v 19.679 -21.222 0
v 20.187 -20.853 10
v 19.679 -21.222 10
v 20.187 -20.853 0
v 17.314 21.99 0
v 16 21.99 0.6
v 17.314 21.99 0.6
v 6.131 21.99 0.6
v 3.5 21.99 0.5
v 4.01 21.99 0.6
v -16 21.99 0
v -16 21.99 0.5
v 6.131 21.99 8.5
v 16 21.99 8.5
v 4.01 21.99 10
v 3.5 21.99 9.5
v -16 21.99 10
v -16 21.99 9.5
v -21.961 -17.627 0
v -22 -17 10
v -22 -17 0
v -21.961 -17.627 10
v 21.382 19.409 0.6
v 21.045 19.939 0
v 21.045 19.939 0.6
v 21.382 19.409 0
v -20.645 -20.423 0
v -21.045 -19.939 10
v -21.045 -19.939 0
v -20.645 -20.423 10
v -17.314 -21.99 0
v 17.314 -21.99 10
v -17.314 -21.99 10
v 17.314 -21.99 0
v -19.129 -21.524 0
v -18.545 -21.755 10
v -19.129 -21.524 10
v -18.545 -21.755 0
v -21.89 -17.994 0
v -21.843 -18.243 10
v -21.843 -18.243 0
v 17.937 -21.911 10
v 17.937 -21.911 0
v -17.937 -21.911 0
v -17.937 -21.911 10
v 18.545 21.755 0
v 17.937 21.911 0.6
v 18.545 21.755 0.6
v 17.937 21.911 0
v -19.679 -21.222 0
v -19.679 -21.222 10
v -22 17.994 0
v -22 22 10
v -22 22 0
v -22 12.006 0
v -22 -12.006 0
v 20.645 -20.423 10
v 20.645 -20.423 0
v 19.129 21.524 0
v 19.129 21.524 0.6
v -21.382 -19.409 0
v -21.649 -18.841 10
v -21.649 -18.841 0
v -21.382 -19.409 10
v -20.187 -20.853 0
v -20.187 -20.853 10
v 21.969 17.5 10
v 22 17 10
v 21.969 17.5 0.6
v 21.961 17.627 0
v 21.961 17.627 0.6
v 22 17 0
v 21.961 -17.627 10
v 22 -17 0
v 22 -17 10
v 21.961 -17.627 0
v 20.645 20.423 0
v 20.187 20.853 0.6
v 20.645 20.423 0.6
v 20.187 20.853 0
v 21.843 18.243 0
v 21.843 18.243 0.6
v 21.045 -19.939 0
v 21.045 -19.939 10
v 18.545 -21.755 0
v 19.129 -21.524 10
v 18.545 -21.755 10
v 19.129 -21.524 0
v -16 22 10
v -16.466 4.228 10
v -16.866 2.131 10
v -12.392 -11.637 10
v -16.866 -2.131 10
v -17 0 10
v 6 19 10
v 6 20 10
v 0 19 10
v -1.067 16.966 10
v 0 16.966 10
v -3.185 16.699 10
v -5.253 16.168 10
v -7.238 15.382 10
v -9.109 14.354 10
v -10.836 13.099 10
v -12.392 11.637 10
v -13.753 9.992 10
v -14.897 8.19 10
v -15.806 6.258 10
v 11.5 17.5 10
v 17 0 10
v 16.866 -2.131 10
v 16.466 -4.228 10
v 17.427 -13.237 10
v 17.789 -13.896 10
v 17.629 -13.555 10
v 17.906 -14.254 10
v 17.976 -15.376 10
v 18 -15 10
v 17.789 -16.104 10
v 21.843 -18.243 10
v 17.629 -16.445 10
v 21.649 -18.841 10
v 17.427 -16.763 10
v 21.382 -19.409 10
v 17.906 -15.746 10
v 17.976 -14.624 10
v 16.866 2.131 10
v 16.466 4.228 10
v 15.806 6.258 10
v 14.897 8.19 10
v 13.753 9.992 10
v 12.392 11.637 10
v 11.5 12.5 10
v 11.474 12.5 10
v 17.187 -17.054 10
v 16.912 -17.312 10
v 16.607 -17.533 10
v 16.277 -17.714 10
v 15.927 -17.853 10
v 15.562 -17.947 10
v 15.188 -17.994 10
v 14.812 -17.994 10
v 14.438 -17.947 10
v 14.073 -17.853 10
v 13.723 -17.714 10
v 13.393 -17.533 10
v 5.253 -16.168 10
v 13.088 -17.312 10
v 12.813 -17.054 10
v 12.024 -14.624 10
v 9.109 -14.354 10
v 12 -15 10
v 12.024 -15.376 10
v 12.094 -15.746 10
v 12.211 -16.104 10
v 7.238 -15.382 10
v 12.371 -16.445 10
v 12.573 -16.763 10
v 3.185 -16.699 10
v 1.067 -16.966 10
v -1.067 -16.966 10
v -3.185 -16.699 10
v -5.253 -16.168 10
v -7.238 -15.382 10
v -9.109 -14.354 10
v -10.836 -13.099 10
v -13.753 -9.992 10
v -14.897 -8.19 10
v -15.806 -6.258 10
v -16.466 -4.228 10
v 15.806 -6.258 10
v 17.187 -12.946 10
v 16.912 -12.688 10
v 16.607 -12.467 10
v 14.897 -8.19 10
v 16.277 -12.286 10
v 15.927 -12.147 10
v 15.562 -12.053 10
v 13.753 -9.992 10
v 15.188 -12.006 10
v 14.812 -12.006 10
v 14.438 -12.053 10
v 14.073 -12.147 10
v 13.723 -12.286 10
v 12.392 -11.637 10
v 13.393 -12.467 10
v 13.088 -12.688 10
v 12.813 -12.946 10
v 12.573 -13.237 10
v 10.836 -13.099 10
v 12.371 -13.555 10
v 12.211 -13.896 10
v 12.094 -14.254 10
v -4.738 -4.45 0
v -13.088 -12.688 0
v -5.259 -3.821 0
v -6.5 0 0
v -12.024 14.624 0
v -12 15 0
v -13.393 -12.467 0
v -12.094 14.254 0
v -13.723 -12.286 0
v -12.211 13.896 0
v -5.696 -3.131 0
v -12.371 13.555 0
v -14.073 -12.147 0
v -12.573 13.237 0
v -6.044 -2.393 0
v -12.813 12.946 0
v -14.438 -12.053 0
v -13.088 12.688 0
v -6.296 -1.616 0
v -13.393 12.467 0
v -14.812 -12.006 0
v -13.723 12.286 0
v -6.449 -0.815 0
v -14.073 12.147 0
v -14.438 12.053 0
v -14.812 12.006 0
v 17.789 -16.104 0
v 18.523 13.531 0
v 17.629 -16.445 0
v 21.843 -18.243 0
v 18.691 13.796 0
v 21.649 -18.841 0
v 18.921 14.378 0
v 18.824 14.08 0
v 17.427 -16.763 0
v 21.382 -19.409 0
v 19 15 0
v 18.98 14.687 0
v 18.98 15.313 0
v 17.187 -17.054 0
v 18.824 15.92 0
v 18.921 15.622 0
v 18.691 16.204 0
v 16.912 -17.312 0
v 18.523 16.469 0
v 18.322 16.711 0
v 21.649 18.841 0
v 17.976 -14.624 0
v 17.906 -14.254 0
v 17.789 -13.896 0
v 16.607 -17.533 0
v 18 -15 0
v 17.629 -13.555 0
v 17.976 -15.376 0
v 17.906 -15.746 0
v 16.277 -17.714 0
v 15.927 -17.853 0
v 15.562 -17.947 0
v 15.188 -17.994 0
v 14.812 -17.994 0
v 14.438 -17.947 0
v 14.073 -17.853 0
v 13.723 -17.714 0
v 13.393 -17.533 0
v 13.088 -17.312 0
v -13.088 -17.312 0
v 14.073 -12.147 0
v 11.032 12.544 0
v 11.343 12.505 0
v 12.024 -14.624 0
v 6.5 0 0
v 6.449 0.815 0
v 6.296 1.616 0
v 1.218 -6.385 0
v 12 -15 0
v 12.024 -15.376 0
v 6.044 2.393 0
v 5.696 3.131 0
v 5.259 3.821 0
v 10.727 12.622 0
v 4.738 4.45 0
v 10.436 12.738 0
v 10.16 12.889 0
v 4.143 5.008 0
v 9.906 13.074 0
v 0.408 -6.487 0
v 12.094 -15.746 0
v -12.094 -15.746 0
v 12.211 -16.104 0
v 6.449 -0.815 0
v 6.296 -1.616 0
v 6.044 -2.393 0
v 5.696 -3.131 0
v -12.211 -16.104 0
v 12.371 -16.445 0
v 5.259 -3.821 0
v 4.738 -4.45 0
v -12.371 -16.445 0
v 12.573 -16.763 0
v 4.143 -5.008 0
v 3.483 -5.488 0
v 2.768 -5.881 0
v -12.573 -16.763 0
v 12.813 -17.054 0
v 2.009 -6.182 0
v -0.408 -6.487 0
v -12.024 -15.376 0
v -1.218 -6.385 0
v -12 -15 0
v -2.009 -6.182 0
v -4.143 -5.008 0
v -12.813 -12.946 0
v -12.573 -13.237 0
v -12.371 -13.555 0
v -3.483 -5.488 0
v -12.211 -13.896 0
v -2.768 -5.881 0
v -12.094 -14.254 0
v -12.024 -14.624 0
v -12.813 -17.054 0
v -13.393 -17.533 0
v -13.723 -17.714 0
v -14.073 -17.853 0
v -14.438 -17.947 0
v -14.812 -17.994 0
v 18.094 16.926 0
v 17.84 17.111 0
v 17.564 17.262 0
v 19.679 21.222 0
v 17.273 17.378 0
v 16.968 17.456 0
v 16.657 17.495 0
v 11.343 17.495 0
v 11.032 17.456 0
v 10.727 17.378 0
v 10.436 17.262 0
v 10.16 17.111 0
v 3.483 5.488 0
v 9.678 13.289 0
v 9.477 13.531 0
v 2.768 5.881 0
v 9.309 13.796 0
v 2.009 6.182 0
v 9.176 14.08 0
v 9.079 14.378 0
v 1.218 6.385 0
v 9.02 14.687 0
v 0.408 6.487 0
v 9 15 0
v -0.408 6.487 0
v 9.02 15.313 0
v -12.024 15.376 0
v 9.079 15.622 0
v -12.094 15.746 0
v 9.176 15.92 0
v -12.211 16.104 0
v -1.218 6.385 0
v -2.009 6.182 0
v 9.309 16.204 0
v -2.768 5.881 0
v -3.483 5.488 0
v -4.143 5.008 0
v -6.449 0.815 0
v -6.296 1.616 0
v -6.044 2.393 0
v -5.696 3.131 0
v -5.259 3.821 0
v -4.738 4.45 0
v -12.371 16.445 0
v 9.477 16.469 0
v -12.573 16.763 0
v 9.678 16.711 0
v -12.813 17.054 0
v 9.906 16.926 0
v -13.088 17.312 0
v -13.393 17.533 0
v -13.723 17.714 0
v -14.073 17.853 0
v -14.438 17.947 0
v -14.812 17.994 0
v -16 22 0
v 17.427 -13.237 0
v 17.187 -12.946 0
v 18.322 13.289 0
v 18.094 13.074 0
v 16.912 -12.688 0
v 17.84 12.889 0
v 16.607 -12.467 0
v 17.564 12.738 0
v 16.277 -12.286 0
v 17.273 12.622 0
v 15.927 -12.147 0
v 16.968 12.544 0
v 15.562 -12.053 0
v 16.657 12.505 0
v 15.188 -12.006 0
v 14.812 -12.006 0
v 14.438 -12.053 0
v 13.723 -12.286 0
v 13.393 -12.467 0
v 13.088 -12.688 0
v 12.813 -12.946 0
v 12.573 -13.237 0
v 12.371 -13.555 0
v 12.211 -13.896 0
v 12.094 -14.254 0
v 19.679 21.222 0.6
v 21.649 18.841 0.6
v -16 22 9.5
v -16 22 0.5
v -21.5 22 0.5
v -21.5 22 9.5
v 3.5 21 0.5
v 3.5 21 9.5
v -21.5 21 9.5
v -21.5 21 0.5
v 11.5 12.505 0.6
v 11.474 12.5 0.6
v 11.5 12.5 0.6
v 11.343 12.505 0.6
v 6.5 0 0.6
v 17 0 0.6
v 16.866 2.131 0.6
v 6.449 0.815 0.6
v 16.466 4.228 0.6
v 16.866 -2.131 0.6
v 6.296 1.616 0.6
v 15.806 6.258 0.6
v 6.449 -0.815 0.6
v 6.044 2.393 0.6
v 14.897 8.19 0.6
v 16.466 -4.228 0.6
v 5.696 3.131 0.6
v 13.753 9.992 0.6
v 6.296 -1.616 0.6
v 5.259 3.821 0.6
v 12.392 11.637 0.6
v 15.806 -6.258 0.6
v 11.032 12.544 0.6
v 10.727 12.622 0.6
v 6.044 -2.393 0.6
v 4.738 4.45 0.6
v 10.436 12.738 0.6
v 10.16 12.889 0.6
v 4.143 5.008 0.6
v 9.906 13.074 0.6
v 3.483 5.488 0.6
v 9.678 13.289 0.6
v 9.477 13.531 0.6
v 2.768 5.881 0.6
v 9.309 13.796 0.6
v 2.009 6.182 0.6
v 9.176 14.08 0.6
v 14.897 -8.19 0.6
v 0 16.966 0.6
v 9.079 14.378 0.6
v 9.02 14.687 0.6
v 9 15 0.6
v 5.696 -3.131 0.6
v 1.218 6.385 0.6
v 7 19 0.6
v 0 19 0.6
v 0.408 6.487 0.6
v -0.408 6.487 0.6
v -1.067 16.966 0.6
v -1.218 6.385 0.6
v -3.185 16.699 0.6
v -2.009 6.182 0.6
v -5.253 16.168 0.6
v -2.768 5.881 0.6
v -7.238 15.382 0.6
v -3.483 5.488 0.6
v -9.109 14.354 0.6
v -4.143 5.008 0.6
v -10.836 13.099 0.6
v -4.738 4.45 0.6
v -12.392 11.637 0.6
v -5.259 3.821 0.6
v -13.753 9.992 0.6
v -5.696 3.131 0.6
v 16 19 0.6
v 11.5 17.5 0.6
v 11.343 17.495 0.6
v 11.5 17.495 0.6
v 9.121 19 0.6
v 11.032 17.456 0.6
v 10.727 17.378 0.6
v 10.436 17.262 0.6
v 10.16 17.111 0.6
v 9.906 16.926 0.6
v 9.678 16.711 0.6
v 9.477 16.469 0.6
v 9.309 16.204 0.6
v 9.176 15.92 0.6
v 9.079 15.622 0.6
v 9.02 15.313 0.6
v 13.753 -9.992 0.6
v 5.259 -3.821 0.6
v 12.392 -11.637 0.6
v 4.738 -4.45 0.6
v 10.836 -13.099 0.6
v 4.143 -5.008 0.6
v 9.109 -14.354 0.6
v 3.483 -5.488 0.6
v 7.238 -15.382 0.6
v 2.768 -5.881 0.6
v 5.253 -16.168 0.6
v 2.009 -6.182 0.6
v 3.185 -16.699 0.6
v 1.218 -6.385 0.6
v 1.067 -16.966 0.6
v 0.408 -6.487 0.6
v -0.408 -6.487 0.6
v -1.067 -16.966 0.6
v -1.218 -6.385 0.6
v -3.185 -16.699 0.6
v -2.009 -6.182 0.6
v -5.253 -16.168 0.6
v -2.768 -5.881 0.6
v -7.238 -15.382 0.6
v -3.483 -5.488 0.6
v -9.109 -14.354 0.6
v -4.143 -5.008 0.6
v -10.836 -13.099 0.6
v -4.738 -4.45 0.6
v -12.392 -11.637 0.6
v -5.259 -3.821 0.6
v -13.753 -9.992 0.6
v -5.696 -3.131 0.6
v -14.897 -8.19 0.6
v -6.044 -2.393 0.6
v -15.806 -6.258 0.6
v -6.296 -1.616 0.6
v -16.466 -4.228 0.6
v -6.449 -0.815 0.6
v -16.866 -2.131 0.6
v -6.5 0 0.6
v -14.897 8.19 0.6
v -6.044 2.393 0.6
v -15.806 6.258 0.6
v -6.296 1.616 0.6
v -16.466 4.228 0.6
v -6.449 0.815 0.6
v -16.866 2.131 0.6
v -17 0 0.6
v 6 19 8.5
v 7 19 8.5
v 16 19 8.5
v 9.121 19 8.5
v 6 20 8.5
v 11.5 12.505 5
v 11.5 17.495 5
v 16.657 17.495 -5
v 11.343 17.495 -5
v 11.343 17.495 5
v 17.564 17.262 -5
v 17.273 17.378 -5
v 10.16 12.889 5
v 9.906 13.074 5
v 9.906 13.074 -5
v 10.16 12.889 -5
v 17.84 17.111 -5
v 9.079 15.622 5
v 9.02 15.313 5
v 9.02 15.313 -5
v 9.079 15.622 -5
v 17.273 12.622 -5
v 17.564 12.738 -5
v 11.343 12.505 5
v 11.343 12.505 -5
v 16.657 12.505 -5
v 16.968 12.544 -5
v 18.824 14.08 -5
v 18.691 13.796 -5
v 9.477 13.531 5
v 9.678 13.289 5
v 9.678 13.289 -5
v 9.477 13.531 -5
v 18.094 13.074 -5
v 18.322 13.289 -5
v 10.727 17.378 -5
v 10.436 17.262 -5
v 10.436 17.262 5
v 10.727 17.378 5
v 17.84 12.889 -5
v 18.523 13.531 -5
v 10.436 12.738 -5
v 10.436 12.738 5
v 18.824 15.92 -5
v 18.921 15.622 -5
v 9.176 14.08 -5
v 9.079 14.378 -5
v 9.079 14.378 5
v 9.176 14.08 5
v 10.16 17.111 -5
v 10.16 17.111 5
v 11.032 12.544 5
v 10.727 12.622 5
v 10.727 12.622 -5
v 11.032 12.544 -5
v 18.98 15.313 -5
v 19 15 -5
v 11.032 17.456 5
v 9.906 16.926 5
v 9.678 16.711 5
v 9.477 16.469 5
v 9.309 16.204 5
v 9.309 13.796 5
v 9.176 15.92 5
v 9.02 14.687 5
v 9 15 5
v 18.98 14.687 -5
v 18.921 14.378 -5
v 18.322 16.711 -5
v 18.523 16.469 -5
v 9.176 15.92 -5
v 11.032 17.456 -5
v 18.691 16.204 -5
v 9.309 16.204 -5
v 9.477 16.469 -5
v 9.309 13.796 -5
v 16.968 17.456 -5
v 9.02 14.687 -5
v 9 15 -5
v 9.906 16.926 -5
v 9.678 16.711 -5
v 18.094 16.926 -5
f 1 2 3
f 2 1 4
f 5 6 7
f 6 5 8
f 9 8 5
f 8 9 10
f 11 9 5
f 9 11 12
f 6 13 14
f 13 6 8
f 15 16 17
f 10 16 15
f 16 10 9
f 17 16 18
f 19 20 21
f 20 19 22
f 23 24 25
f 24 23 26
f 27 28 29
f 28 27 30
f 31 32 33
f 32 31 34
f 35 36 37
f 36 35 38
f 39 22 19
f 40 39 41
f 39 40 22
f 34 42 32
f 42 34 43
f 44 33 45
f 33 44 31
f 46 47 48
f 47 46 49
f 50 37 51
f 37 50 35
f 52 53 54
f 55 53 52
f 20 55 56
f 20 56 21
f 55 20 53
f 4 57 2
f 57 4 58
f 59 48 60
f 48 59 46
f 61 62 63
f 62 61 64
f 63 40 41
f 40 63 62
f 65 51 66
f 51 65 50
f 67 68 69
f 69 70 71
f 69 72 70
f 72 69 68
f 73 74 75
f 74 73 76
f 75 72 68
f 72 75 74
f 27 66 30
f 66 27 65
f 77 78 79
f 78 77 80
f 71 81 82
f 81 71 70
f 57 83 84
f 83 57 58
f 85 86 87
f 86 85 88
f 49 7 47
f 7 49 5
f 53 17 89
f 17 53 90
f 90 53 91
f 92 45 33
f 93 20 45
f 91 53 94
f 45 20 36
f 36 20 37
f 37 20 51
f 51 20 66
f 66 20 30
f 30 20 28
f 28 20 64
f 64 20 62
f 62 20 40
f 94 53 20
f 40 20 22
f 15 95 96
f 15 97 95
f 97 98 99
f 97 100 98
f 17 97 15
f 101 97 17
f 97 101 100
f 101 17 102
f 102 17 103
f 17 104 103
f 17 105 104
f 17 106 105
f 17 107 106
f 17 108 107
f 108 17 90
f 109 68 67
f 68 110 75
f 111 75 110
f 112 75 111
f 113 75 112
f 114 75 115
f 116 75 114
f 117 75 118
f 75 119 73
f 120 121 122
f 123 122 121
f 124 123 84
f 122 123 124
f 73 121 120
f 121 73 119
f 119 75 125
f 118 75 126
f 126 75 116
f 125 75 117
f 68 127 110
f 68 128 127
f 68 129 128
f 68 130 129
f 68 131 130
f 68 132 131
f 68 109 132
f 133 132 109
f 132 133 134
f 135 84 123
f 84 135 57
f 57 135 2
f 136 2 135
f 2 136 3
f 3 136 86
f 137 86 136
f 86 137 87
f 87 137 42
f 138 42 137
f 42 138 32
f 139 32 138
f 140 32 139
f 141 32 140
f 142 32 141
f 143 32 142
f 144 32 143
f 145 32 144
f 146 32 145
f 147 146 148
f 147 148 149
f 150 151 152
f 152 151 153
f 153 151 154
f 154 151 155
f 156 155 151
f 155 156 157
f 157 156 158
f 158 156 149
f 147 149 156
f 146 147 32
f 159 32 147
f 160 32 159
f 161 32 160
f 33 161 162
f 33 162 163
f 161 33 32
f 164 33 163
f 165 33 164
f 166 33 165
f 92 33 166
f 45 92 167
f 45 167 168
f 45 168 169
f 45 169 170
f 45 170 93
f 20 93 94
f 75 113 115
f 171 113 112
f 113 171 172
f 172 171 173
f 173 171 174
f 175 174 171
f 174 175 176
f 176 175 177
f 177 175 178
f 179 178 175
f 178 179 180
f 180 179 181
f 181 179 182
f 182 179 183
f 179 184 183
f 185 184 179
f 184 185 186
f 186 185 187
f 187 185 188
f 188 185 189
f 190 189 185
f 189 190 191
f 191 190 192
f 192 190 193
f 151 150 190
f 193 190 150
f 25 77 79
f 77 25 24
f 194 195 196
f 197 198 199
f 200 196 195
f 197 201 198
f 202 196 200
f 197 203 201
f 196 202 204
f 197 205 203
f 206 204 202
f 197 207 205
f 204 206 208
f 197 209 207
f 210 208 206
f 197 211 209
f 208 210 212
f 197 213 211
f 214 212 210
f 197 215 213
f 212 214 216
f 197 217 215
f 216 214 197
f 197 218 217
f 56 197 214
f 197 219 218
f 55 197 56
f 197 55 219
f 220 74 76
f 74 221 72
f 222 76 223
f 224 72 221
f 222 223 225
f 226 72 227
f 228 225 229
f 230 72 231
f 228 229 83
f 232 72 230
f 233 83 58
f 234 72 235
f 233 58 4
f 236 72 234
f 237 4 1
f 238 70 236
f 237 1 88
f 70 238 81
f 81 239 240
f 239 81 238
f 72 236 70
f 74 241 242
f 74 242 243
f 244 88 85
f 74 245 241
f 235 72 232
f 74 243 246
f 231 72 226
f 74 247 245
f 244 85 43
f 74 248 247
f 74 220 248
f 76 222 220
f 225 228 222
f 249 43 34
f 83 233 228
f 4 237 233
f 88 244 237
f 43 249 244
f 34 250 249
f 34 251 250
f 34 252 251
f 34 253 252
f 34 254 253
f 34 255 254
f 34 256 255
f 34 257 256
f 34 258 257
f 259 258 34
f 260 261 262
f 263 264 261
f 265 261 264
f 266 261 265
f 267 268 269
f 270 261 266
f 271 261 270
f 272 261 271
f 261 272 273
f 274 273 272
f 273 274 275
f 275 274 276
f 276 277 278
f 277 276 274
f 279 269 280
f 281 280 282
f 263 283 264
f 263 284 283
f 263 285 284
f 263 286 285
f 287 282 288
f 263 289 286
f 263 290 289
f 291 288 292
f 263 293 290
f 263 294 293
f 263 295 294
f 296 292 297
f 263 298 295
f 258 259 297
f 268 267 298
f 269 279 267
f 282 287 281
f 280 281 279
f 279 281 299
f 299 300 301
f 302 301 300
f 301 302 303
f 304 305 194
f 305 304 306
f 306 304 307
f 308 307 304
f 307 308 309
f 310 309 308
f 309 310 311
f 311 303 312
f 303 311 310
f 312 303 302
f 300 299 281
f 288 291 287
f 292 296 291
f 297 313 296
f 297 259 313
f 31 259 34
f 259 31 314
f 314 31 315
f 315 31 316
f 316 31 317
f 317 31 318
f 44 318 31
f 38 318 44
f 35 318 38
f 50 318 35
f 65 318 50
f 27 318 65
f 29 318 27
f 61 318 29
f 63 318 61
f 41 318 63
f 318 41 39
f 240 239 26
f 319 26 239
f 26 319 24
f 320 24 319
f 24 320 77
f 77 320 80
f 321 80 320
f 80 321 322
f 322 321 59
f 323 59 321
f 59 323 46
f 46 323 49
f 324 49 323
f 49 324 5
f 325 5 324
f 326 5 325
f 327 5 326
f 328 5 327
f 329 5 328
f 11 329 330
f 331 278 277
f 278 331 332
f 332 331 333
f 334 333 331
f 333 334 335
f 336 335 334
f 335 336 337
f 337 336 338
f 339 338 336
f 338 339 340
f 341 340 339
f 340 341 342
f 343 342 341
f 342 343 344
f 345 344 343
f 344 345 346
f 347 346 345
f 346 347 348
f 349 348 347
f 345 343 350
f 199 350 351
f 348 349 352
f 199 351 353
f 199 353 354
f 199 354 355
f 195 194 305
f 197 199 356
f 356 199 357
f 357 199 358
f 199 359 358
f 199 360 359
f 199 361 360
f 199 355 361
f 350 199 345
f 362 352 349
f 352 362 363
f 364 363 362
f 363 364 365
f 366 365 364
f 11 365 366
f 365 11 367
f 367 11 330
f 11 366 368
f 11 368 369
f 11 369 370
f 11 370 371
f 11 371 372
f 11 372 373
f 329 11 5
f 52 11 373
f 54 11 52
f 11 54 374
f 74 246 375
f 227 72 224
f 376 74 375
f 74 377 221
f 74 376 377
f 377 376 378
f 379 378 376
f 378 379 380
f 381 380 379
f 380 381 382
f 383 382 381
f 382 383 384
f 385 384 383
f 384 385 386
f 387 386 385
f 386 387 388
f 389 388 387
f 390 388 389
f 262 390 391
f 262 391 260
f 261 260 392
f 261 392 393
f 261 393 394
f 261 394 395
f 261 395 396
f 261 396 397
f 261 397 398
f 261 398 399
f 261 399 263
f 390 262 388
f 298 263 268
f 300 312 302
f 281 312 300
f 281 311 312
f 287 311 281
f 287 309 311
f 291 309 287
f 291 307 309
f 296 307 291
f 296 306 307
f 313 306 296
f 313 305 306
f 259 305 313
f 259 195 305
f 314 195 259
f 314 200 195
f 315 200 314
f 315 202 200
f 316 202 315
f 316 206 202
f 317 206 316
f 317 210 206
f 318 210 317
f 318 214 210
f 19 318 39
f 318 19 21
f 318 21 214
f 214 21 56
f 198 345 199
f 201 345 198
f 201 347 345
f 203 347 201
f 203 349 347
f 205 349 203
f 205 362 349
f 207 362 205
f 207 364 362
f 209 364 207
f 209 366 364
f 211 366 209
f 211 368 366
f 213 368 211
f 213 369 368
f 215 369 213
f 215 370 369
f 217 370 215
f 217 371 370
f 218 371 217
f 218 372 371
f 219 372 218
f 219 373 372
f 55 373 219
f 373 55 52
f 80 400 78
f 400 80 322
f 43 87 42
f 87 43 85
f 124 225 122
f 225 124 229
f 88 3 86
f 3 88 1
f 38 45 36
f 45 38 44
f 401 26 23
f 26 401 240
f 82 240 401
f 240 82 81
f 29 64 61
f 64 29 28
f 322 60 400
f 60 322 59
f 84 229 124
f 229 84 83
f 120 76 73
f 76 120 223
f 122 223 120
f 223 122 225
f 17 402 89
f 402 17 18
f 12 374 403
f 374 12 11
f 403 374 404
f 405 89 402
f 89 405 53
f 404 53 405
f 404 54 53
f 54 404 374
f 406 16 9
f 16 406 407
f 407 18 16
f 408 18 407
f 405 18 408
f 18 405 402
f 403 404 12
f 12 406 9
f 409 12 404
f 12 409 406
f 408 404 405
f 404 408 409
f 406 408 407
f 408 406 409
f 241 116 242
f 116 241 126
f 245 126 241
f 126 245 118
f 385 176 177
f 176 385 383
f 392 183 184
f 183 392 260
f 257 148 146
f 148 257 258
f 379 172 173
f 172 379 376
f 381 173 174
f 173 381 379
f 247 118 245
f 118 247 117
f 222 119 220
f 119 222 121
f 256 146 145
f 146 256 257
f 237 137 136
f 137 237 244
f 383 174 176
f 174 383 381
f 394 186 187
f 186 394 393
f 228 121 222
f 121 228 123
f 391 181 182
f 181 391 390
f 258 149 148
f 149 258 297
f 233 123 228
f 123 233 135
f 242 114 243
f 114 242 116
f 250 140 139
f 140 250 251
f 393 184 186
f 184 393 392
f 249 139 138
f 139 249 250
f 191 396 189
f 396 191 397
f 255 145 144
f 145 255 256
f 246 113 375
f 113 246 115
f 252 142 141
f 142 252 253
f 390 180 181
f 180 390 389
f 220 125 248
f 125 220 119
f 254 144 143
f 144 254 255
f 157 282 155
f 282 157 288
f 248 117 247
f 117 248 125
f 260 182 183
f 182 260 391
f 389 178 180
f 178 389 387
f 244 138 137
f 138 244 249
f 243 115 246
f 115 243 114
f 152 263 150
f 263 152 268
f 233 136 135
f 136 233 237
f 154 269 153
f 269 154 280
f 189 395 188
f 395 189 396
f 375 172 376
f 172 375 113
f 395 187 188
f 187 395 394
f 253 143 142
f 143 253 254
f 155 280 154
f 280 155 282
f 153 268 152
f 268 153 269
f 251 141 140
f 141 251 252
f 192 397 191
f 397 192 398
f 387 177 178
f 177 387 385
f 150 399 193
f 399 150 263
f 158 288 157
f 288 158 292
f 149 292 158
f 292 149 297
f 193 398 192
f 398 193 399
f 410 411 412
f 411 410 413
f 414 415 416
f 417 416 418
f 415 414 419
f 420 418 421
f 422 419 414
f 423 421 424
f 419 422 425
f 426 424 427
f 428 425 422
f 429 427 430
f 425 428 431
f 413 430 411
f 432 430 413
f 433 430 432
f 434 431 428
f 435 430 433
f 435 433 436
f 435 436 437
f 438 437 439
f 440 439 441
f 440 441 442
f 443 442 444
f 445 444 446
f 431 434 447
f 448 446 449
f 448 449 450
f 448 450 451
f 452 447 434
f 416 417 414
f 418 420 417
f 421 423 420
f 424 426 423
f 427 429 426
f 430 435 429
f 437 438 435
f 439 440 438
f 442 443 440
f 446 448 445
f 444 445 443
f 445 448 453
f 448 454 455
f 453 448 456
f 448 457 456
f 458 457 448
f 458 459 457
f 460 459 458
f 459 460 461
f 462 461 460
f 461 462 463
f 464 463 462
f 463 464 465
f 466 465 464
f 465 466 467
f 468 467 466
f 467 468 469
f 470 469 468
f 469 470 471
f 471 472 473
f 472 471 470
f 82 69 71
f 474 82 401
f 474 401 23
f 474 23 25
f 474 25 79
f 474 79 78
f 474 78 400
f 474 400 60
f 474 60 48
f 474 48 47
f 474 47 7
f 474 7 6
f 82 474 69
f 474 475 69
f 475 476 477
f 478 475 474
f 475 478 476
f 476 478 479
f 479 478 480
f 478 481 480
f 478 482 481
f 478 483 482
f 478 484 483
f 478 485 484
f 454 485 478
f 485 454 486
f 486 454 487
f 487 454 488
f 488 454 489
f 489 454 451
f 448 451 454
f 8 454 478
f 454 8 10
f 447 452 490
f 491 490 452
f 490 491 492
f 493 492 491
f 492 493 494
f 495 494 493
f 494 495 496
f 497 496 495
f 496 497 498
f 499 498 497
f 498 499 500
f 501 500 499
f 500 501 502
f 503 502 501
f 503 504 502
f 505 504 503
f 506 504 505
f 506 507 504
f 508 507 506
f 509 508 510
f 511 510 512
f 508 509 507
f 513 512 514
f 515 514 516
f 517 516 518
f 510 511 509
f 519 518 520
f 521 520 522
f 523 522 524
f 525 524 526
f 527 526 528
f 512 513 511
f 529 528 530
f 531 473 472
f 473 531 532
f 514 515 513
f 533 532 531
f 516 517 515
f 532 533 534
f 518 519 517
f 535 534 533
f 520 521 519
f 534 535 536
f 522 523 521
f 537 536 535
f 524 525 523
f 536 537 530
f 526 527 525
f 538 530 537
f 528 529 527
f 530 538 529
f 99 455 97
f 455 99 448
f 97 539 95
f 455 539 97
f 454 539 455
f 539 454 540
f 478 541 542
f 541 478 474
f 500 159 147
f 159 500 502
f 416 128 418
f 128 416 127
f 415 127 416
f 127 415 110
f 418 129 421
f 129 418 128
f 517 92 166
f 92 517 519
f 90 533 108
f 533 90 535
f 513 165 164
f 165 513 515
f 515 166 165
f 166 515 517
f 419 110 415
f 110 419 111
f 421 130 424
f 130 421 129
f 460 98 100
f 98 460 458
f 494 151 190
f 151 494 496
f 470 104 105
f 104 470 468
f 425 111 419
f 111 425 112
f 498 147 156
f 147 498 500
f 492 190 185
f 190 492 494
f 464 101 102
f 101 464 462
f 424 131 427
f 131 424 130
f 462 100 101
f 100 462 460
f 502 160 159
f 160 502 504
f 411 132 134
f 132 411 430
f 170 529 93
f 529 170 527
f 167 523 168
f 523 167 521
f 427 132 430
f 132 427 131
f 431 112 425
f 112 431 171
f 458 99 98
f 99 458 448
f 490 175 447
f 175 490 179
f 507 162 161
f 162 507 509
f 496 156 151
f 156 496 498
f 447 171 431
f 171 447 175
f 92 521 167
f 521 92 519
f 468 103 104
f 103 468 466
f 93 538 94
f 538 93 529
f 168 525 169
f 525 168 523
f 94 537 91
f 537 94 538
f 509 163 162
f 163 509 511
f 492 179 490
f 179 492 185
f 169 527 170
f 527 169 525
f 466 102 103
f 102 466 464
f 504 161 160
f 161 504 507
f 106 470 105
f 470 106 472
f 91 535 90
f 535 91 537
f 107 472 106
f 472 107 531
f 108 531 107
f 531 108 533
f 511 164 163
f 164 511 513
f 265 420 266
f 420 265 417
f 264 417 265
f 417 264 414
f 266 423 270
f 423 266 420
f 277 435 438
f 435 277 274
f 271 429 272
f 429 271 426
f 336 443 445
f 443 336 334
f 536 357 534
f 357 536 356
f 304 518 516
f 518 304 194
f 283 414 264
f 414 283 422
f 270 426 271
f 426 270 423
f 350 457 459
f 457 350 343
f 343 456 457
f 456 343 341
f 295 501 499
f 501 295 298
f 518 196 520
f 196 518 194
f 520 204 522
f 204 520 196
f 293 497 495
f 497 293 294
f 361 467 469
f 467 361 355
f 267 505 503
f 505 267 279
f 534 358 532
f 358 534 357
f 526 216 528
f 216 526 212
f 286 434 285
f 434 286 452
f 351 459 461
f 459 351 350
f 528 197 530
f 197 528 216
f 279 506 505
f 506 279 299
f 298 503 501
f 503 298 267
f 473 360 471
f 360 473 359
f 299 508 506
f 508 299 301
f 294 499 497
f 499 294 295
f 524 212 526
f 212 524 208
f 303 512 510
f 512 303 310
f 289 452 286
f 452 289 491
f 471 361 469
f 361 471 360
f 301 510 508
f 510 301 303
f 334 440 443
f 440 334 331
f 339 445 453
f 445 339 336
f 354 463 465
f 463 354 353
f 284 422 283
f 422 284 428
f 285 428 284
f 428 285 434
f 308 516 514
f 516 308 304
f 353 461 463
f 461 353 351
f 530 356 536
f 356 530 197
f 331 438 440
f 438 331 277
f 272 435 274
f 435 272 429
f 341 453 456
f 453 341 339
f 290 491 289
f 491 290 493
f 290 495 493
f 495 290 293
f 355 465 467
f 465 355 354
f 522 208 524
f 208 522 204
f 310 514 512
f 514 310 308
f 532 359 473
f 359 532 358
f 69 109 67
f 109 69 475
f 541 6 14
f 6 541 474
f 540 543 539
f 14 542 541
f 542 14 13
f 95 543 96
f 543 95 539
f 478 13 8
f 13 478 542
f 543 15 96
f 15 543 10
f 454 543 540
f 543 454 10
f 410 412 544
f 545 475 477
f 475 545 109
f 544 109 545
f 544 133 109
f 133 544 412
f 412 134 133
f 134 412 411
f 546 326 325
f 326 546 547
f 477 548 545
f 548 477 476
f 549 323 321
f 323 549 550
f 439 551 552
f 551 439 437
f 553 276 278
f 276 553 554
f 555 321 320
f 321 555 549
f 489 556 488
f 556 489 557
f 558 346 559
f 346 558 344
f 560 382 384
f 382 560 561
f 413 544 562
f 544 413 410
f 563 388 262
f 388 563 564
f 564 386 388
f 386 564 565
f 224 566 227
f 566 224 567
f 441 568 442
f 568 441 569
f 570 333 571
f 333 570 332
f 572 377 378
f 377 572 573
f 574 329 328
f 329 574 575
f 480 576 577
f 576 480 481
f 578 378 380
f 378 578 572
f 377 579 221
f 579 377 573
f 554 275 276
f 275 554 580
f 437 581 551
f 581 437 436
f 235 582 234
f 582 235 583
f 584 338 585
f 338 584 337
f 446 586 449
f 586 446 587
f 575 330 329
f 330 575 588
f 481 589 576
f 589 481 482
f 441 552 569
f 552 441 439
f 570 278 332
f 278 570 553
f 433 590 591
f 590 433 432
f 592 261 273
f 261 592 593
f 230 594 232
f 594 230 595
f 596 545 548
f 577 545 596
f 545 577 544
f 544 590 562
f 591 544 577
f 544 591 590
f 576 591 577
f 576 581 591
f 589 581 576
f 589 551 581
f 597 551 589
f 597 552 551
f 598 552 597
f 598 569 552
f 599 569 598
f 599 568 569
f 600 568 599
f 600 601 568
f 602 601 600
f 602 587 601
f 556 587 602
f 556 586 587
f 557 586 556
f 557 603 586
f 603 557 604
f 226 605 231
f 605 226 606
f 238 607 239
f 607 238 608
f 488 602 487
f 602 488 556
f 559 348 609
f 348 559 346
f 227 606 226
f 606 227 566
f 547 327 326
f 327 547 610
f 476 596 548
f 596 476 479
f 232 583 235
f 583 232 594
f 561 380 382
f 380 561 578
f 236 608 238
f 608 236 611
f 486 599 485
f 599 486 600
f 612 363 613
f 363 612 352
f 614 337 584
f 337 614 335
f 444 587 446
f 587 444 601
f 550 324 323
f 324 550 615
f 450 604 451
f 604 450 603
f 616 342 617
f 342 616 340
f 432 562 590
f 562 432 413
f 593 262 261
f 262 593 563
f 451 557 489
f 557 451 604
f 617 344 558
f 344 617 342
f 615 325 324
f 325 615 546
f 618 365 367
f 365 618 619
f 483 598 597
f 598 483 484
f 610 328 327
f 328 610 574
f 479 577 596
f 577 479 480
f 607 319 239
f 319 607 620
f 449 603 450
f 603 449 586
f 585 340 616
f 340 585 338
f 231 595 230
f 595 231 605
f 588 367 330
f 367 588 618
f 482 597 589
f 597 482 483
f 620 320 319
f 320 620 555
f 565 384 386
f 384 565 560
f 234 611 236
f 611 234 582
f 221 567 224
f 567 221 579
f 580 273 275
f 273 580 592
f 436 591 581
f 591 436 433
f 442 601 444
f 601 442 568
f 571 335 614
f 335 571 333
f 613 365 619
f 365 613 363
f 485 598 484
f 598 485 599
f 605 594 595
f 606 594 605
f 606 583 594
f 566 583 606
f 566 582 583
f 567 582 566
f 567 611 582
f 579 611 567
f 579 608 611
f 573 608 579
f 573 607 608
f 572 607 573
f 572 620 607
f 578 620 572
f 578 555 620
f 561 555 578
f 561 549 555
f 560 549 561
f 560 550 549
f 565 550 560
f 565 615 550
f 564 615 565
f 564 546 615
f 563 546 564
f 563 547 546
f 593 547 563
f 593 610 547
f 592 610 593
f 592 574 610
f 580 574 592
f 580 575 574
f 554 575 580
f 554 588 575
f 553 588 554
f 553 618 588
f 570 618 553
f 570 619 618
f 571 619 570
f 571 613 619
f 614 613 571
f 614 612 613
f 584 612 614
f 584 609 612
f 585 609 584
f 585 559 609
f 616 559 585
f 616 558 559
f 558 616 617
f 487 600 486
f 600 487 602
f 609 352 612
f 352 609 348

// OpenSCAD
$fn = 50;


union() {
	difference() {
		union() {
			hull() {
				translate(v = [-17.0000000000, 17.0000000000, 0]) {
					cylinder(h = 10, r = 5);
				}
				translate(v = [17.0000000000, 17.0000000000, 0]) {
					cylinder(h = 10, r = 5);
				}
				translate(v = [-17.0000000000, -17.0000000000, 0]) {
					cylinder(h = 10, r = 5);
				}
				translate(v = [17.0000000000, -17.0000000000, 0]) {
					cylinder(h = 10, r = 5);
				}
			}
			translate(v = [-22.0000000000, 16.0000000000, 0]) {
				cube(size = [6, 6, 10]);
			}
		}
		union() {
			translate(v = [-22.5000000000, -15.0000000000, -250.0000000000]) {
				rotate(a = [0, 0, 0]) {
					difference() {
						union() {
							hull() {
								translate(v = [7.5000000000, 0, 0]) {
									cylinder(h = 250, r = 3.0000000000, r1 = 3.0000000000, r2 = 3.0000000000);
								}
								translate(v = [-7.5000000000, 0, 0]) {
									cylinder(h = 250, r = 3.0000000000, r1 = 3.0000000000, r2 = 3.0000000000);
								}
							}
						}
						union();
					}
				}
			}
			translate(v = [-22.5000000000, 15.0000000000, -250.0000000000]) {
				rotate(a = [0, 0, 0]) {
					difference() {
						union() {
							hull() {
								translate(v = [7.5000000000, 0, 0]) {
									cylinder(h = 250, r = 3.0000000000, r1 = 3.0000000000, r2 = 3.0000000000);
								}
								translate(v = [-7.5000000000, 0, 0]) {
									cylinder(h = 250, r = 3.0000000000, r1 = 3.0000000000, r2 = 3.0000000000);
								}
							}
						}
						union();
					}
				}
			}
			translate(v = [-21.5000000000, 21.0000000000, 0.5000000000]) {
				cube(size = [25, 1, 9.0000000000]);
			}
			translate(v = [15.0000000000, -15.0000000000, 0]) {
				cylinder(h = 100, r = 3.0000000000);
			}
			translate(v = [0.0000000000, 11.0000000000, 0.6000000000]) {
				cube(size = [11, 8, 12.4000000000]);
			}
			translate(v = [0, 0, 0.6000000000]) {
				cylinder(h = 12.4000000000, r = 17.0000000000);
			}
			translate(v = [0, 0, -5.0000000000]) {
				cylinder(h = 10, r = 6.5000000000);
			}
			translate(v = [0.0000000000, 17.5000000000, 0.6000000000]) {
				cube(size = [22.0000000000, 1.5000000000, 12.4000000000]);
			}
			translate(v = [16.0000000000, 17.5000000000, 0.6000000000]) {
				cube(size = [6, 4.5000000000, 12.4000000000]);
			}
			translate(v = [6.0000000000, 17.5000000000, 8.5000000000]) {
				cube(size = [16, 4.5000000000, 1.5000000000]);
			}
			translate(v = [3.2500000000, 22.7500000000, 0.6000000000]) {
				rotate(a = [0, 0, -45]) {
					cube(size = [7.5000000000, 1.5000000000, 12.4000000000]);
				}
			}
			translate(v = [2.5000000000, 12.5000000000, 0.6000000000]) {
				cube(size = [9.0000000000, 5, 9.4000000000]);
			}
		}
	}
	union() {
		translate(v = [14, 15.0000000000, -5.0000000000]) {
			rotate(a = [0, 0, 0]) {
				difference() {
					union() {
						#hull() {
							#translate(v = [2.5000000000, 0, 0]) {
								cylinder(h = 10, r = 2.5000000000, r1 = 2.5000000000, r2 = 2.5000000000);
							}
							#translate(v = [-2.5000000000, 0, 0]) {
								cylinder(h = 10, r = 2.5000000000, r1 = 2.5000000000, r2 = 2.5000000000);
							}
						}
					}
					union();
				}
			}
		}
	}
}
